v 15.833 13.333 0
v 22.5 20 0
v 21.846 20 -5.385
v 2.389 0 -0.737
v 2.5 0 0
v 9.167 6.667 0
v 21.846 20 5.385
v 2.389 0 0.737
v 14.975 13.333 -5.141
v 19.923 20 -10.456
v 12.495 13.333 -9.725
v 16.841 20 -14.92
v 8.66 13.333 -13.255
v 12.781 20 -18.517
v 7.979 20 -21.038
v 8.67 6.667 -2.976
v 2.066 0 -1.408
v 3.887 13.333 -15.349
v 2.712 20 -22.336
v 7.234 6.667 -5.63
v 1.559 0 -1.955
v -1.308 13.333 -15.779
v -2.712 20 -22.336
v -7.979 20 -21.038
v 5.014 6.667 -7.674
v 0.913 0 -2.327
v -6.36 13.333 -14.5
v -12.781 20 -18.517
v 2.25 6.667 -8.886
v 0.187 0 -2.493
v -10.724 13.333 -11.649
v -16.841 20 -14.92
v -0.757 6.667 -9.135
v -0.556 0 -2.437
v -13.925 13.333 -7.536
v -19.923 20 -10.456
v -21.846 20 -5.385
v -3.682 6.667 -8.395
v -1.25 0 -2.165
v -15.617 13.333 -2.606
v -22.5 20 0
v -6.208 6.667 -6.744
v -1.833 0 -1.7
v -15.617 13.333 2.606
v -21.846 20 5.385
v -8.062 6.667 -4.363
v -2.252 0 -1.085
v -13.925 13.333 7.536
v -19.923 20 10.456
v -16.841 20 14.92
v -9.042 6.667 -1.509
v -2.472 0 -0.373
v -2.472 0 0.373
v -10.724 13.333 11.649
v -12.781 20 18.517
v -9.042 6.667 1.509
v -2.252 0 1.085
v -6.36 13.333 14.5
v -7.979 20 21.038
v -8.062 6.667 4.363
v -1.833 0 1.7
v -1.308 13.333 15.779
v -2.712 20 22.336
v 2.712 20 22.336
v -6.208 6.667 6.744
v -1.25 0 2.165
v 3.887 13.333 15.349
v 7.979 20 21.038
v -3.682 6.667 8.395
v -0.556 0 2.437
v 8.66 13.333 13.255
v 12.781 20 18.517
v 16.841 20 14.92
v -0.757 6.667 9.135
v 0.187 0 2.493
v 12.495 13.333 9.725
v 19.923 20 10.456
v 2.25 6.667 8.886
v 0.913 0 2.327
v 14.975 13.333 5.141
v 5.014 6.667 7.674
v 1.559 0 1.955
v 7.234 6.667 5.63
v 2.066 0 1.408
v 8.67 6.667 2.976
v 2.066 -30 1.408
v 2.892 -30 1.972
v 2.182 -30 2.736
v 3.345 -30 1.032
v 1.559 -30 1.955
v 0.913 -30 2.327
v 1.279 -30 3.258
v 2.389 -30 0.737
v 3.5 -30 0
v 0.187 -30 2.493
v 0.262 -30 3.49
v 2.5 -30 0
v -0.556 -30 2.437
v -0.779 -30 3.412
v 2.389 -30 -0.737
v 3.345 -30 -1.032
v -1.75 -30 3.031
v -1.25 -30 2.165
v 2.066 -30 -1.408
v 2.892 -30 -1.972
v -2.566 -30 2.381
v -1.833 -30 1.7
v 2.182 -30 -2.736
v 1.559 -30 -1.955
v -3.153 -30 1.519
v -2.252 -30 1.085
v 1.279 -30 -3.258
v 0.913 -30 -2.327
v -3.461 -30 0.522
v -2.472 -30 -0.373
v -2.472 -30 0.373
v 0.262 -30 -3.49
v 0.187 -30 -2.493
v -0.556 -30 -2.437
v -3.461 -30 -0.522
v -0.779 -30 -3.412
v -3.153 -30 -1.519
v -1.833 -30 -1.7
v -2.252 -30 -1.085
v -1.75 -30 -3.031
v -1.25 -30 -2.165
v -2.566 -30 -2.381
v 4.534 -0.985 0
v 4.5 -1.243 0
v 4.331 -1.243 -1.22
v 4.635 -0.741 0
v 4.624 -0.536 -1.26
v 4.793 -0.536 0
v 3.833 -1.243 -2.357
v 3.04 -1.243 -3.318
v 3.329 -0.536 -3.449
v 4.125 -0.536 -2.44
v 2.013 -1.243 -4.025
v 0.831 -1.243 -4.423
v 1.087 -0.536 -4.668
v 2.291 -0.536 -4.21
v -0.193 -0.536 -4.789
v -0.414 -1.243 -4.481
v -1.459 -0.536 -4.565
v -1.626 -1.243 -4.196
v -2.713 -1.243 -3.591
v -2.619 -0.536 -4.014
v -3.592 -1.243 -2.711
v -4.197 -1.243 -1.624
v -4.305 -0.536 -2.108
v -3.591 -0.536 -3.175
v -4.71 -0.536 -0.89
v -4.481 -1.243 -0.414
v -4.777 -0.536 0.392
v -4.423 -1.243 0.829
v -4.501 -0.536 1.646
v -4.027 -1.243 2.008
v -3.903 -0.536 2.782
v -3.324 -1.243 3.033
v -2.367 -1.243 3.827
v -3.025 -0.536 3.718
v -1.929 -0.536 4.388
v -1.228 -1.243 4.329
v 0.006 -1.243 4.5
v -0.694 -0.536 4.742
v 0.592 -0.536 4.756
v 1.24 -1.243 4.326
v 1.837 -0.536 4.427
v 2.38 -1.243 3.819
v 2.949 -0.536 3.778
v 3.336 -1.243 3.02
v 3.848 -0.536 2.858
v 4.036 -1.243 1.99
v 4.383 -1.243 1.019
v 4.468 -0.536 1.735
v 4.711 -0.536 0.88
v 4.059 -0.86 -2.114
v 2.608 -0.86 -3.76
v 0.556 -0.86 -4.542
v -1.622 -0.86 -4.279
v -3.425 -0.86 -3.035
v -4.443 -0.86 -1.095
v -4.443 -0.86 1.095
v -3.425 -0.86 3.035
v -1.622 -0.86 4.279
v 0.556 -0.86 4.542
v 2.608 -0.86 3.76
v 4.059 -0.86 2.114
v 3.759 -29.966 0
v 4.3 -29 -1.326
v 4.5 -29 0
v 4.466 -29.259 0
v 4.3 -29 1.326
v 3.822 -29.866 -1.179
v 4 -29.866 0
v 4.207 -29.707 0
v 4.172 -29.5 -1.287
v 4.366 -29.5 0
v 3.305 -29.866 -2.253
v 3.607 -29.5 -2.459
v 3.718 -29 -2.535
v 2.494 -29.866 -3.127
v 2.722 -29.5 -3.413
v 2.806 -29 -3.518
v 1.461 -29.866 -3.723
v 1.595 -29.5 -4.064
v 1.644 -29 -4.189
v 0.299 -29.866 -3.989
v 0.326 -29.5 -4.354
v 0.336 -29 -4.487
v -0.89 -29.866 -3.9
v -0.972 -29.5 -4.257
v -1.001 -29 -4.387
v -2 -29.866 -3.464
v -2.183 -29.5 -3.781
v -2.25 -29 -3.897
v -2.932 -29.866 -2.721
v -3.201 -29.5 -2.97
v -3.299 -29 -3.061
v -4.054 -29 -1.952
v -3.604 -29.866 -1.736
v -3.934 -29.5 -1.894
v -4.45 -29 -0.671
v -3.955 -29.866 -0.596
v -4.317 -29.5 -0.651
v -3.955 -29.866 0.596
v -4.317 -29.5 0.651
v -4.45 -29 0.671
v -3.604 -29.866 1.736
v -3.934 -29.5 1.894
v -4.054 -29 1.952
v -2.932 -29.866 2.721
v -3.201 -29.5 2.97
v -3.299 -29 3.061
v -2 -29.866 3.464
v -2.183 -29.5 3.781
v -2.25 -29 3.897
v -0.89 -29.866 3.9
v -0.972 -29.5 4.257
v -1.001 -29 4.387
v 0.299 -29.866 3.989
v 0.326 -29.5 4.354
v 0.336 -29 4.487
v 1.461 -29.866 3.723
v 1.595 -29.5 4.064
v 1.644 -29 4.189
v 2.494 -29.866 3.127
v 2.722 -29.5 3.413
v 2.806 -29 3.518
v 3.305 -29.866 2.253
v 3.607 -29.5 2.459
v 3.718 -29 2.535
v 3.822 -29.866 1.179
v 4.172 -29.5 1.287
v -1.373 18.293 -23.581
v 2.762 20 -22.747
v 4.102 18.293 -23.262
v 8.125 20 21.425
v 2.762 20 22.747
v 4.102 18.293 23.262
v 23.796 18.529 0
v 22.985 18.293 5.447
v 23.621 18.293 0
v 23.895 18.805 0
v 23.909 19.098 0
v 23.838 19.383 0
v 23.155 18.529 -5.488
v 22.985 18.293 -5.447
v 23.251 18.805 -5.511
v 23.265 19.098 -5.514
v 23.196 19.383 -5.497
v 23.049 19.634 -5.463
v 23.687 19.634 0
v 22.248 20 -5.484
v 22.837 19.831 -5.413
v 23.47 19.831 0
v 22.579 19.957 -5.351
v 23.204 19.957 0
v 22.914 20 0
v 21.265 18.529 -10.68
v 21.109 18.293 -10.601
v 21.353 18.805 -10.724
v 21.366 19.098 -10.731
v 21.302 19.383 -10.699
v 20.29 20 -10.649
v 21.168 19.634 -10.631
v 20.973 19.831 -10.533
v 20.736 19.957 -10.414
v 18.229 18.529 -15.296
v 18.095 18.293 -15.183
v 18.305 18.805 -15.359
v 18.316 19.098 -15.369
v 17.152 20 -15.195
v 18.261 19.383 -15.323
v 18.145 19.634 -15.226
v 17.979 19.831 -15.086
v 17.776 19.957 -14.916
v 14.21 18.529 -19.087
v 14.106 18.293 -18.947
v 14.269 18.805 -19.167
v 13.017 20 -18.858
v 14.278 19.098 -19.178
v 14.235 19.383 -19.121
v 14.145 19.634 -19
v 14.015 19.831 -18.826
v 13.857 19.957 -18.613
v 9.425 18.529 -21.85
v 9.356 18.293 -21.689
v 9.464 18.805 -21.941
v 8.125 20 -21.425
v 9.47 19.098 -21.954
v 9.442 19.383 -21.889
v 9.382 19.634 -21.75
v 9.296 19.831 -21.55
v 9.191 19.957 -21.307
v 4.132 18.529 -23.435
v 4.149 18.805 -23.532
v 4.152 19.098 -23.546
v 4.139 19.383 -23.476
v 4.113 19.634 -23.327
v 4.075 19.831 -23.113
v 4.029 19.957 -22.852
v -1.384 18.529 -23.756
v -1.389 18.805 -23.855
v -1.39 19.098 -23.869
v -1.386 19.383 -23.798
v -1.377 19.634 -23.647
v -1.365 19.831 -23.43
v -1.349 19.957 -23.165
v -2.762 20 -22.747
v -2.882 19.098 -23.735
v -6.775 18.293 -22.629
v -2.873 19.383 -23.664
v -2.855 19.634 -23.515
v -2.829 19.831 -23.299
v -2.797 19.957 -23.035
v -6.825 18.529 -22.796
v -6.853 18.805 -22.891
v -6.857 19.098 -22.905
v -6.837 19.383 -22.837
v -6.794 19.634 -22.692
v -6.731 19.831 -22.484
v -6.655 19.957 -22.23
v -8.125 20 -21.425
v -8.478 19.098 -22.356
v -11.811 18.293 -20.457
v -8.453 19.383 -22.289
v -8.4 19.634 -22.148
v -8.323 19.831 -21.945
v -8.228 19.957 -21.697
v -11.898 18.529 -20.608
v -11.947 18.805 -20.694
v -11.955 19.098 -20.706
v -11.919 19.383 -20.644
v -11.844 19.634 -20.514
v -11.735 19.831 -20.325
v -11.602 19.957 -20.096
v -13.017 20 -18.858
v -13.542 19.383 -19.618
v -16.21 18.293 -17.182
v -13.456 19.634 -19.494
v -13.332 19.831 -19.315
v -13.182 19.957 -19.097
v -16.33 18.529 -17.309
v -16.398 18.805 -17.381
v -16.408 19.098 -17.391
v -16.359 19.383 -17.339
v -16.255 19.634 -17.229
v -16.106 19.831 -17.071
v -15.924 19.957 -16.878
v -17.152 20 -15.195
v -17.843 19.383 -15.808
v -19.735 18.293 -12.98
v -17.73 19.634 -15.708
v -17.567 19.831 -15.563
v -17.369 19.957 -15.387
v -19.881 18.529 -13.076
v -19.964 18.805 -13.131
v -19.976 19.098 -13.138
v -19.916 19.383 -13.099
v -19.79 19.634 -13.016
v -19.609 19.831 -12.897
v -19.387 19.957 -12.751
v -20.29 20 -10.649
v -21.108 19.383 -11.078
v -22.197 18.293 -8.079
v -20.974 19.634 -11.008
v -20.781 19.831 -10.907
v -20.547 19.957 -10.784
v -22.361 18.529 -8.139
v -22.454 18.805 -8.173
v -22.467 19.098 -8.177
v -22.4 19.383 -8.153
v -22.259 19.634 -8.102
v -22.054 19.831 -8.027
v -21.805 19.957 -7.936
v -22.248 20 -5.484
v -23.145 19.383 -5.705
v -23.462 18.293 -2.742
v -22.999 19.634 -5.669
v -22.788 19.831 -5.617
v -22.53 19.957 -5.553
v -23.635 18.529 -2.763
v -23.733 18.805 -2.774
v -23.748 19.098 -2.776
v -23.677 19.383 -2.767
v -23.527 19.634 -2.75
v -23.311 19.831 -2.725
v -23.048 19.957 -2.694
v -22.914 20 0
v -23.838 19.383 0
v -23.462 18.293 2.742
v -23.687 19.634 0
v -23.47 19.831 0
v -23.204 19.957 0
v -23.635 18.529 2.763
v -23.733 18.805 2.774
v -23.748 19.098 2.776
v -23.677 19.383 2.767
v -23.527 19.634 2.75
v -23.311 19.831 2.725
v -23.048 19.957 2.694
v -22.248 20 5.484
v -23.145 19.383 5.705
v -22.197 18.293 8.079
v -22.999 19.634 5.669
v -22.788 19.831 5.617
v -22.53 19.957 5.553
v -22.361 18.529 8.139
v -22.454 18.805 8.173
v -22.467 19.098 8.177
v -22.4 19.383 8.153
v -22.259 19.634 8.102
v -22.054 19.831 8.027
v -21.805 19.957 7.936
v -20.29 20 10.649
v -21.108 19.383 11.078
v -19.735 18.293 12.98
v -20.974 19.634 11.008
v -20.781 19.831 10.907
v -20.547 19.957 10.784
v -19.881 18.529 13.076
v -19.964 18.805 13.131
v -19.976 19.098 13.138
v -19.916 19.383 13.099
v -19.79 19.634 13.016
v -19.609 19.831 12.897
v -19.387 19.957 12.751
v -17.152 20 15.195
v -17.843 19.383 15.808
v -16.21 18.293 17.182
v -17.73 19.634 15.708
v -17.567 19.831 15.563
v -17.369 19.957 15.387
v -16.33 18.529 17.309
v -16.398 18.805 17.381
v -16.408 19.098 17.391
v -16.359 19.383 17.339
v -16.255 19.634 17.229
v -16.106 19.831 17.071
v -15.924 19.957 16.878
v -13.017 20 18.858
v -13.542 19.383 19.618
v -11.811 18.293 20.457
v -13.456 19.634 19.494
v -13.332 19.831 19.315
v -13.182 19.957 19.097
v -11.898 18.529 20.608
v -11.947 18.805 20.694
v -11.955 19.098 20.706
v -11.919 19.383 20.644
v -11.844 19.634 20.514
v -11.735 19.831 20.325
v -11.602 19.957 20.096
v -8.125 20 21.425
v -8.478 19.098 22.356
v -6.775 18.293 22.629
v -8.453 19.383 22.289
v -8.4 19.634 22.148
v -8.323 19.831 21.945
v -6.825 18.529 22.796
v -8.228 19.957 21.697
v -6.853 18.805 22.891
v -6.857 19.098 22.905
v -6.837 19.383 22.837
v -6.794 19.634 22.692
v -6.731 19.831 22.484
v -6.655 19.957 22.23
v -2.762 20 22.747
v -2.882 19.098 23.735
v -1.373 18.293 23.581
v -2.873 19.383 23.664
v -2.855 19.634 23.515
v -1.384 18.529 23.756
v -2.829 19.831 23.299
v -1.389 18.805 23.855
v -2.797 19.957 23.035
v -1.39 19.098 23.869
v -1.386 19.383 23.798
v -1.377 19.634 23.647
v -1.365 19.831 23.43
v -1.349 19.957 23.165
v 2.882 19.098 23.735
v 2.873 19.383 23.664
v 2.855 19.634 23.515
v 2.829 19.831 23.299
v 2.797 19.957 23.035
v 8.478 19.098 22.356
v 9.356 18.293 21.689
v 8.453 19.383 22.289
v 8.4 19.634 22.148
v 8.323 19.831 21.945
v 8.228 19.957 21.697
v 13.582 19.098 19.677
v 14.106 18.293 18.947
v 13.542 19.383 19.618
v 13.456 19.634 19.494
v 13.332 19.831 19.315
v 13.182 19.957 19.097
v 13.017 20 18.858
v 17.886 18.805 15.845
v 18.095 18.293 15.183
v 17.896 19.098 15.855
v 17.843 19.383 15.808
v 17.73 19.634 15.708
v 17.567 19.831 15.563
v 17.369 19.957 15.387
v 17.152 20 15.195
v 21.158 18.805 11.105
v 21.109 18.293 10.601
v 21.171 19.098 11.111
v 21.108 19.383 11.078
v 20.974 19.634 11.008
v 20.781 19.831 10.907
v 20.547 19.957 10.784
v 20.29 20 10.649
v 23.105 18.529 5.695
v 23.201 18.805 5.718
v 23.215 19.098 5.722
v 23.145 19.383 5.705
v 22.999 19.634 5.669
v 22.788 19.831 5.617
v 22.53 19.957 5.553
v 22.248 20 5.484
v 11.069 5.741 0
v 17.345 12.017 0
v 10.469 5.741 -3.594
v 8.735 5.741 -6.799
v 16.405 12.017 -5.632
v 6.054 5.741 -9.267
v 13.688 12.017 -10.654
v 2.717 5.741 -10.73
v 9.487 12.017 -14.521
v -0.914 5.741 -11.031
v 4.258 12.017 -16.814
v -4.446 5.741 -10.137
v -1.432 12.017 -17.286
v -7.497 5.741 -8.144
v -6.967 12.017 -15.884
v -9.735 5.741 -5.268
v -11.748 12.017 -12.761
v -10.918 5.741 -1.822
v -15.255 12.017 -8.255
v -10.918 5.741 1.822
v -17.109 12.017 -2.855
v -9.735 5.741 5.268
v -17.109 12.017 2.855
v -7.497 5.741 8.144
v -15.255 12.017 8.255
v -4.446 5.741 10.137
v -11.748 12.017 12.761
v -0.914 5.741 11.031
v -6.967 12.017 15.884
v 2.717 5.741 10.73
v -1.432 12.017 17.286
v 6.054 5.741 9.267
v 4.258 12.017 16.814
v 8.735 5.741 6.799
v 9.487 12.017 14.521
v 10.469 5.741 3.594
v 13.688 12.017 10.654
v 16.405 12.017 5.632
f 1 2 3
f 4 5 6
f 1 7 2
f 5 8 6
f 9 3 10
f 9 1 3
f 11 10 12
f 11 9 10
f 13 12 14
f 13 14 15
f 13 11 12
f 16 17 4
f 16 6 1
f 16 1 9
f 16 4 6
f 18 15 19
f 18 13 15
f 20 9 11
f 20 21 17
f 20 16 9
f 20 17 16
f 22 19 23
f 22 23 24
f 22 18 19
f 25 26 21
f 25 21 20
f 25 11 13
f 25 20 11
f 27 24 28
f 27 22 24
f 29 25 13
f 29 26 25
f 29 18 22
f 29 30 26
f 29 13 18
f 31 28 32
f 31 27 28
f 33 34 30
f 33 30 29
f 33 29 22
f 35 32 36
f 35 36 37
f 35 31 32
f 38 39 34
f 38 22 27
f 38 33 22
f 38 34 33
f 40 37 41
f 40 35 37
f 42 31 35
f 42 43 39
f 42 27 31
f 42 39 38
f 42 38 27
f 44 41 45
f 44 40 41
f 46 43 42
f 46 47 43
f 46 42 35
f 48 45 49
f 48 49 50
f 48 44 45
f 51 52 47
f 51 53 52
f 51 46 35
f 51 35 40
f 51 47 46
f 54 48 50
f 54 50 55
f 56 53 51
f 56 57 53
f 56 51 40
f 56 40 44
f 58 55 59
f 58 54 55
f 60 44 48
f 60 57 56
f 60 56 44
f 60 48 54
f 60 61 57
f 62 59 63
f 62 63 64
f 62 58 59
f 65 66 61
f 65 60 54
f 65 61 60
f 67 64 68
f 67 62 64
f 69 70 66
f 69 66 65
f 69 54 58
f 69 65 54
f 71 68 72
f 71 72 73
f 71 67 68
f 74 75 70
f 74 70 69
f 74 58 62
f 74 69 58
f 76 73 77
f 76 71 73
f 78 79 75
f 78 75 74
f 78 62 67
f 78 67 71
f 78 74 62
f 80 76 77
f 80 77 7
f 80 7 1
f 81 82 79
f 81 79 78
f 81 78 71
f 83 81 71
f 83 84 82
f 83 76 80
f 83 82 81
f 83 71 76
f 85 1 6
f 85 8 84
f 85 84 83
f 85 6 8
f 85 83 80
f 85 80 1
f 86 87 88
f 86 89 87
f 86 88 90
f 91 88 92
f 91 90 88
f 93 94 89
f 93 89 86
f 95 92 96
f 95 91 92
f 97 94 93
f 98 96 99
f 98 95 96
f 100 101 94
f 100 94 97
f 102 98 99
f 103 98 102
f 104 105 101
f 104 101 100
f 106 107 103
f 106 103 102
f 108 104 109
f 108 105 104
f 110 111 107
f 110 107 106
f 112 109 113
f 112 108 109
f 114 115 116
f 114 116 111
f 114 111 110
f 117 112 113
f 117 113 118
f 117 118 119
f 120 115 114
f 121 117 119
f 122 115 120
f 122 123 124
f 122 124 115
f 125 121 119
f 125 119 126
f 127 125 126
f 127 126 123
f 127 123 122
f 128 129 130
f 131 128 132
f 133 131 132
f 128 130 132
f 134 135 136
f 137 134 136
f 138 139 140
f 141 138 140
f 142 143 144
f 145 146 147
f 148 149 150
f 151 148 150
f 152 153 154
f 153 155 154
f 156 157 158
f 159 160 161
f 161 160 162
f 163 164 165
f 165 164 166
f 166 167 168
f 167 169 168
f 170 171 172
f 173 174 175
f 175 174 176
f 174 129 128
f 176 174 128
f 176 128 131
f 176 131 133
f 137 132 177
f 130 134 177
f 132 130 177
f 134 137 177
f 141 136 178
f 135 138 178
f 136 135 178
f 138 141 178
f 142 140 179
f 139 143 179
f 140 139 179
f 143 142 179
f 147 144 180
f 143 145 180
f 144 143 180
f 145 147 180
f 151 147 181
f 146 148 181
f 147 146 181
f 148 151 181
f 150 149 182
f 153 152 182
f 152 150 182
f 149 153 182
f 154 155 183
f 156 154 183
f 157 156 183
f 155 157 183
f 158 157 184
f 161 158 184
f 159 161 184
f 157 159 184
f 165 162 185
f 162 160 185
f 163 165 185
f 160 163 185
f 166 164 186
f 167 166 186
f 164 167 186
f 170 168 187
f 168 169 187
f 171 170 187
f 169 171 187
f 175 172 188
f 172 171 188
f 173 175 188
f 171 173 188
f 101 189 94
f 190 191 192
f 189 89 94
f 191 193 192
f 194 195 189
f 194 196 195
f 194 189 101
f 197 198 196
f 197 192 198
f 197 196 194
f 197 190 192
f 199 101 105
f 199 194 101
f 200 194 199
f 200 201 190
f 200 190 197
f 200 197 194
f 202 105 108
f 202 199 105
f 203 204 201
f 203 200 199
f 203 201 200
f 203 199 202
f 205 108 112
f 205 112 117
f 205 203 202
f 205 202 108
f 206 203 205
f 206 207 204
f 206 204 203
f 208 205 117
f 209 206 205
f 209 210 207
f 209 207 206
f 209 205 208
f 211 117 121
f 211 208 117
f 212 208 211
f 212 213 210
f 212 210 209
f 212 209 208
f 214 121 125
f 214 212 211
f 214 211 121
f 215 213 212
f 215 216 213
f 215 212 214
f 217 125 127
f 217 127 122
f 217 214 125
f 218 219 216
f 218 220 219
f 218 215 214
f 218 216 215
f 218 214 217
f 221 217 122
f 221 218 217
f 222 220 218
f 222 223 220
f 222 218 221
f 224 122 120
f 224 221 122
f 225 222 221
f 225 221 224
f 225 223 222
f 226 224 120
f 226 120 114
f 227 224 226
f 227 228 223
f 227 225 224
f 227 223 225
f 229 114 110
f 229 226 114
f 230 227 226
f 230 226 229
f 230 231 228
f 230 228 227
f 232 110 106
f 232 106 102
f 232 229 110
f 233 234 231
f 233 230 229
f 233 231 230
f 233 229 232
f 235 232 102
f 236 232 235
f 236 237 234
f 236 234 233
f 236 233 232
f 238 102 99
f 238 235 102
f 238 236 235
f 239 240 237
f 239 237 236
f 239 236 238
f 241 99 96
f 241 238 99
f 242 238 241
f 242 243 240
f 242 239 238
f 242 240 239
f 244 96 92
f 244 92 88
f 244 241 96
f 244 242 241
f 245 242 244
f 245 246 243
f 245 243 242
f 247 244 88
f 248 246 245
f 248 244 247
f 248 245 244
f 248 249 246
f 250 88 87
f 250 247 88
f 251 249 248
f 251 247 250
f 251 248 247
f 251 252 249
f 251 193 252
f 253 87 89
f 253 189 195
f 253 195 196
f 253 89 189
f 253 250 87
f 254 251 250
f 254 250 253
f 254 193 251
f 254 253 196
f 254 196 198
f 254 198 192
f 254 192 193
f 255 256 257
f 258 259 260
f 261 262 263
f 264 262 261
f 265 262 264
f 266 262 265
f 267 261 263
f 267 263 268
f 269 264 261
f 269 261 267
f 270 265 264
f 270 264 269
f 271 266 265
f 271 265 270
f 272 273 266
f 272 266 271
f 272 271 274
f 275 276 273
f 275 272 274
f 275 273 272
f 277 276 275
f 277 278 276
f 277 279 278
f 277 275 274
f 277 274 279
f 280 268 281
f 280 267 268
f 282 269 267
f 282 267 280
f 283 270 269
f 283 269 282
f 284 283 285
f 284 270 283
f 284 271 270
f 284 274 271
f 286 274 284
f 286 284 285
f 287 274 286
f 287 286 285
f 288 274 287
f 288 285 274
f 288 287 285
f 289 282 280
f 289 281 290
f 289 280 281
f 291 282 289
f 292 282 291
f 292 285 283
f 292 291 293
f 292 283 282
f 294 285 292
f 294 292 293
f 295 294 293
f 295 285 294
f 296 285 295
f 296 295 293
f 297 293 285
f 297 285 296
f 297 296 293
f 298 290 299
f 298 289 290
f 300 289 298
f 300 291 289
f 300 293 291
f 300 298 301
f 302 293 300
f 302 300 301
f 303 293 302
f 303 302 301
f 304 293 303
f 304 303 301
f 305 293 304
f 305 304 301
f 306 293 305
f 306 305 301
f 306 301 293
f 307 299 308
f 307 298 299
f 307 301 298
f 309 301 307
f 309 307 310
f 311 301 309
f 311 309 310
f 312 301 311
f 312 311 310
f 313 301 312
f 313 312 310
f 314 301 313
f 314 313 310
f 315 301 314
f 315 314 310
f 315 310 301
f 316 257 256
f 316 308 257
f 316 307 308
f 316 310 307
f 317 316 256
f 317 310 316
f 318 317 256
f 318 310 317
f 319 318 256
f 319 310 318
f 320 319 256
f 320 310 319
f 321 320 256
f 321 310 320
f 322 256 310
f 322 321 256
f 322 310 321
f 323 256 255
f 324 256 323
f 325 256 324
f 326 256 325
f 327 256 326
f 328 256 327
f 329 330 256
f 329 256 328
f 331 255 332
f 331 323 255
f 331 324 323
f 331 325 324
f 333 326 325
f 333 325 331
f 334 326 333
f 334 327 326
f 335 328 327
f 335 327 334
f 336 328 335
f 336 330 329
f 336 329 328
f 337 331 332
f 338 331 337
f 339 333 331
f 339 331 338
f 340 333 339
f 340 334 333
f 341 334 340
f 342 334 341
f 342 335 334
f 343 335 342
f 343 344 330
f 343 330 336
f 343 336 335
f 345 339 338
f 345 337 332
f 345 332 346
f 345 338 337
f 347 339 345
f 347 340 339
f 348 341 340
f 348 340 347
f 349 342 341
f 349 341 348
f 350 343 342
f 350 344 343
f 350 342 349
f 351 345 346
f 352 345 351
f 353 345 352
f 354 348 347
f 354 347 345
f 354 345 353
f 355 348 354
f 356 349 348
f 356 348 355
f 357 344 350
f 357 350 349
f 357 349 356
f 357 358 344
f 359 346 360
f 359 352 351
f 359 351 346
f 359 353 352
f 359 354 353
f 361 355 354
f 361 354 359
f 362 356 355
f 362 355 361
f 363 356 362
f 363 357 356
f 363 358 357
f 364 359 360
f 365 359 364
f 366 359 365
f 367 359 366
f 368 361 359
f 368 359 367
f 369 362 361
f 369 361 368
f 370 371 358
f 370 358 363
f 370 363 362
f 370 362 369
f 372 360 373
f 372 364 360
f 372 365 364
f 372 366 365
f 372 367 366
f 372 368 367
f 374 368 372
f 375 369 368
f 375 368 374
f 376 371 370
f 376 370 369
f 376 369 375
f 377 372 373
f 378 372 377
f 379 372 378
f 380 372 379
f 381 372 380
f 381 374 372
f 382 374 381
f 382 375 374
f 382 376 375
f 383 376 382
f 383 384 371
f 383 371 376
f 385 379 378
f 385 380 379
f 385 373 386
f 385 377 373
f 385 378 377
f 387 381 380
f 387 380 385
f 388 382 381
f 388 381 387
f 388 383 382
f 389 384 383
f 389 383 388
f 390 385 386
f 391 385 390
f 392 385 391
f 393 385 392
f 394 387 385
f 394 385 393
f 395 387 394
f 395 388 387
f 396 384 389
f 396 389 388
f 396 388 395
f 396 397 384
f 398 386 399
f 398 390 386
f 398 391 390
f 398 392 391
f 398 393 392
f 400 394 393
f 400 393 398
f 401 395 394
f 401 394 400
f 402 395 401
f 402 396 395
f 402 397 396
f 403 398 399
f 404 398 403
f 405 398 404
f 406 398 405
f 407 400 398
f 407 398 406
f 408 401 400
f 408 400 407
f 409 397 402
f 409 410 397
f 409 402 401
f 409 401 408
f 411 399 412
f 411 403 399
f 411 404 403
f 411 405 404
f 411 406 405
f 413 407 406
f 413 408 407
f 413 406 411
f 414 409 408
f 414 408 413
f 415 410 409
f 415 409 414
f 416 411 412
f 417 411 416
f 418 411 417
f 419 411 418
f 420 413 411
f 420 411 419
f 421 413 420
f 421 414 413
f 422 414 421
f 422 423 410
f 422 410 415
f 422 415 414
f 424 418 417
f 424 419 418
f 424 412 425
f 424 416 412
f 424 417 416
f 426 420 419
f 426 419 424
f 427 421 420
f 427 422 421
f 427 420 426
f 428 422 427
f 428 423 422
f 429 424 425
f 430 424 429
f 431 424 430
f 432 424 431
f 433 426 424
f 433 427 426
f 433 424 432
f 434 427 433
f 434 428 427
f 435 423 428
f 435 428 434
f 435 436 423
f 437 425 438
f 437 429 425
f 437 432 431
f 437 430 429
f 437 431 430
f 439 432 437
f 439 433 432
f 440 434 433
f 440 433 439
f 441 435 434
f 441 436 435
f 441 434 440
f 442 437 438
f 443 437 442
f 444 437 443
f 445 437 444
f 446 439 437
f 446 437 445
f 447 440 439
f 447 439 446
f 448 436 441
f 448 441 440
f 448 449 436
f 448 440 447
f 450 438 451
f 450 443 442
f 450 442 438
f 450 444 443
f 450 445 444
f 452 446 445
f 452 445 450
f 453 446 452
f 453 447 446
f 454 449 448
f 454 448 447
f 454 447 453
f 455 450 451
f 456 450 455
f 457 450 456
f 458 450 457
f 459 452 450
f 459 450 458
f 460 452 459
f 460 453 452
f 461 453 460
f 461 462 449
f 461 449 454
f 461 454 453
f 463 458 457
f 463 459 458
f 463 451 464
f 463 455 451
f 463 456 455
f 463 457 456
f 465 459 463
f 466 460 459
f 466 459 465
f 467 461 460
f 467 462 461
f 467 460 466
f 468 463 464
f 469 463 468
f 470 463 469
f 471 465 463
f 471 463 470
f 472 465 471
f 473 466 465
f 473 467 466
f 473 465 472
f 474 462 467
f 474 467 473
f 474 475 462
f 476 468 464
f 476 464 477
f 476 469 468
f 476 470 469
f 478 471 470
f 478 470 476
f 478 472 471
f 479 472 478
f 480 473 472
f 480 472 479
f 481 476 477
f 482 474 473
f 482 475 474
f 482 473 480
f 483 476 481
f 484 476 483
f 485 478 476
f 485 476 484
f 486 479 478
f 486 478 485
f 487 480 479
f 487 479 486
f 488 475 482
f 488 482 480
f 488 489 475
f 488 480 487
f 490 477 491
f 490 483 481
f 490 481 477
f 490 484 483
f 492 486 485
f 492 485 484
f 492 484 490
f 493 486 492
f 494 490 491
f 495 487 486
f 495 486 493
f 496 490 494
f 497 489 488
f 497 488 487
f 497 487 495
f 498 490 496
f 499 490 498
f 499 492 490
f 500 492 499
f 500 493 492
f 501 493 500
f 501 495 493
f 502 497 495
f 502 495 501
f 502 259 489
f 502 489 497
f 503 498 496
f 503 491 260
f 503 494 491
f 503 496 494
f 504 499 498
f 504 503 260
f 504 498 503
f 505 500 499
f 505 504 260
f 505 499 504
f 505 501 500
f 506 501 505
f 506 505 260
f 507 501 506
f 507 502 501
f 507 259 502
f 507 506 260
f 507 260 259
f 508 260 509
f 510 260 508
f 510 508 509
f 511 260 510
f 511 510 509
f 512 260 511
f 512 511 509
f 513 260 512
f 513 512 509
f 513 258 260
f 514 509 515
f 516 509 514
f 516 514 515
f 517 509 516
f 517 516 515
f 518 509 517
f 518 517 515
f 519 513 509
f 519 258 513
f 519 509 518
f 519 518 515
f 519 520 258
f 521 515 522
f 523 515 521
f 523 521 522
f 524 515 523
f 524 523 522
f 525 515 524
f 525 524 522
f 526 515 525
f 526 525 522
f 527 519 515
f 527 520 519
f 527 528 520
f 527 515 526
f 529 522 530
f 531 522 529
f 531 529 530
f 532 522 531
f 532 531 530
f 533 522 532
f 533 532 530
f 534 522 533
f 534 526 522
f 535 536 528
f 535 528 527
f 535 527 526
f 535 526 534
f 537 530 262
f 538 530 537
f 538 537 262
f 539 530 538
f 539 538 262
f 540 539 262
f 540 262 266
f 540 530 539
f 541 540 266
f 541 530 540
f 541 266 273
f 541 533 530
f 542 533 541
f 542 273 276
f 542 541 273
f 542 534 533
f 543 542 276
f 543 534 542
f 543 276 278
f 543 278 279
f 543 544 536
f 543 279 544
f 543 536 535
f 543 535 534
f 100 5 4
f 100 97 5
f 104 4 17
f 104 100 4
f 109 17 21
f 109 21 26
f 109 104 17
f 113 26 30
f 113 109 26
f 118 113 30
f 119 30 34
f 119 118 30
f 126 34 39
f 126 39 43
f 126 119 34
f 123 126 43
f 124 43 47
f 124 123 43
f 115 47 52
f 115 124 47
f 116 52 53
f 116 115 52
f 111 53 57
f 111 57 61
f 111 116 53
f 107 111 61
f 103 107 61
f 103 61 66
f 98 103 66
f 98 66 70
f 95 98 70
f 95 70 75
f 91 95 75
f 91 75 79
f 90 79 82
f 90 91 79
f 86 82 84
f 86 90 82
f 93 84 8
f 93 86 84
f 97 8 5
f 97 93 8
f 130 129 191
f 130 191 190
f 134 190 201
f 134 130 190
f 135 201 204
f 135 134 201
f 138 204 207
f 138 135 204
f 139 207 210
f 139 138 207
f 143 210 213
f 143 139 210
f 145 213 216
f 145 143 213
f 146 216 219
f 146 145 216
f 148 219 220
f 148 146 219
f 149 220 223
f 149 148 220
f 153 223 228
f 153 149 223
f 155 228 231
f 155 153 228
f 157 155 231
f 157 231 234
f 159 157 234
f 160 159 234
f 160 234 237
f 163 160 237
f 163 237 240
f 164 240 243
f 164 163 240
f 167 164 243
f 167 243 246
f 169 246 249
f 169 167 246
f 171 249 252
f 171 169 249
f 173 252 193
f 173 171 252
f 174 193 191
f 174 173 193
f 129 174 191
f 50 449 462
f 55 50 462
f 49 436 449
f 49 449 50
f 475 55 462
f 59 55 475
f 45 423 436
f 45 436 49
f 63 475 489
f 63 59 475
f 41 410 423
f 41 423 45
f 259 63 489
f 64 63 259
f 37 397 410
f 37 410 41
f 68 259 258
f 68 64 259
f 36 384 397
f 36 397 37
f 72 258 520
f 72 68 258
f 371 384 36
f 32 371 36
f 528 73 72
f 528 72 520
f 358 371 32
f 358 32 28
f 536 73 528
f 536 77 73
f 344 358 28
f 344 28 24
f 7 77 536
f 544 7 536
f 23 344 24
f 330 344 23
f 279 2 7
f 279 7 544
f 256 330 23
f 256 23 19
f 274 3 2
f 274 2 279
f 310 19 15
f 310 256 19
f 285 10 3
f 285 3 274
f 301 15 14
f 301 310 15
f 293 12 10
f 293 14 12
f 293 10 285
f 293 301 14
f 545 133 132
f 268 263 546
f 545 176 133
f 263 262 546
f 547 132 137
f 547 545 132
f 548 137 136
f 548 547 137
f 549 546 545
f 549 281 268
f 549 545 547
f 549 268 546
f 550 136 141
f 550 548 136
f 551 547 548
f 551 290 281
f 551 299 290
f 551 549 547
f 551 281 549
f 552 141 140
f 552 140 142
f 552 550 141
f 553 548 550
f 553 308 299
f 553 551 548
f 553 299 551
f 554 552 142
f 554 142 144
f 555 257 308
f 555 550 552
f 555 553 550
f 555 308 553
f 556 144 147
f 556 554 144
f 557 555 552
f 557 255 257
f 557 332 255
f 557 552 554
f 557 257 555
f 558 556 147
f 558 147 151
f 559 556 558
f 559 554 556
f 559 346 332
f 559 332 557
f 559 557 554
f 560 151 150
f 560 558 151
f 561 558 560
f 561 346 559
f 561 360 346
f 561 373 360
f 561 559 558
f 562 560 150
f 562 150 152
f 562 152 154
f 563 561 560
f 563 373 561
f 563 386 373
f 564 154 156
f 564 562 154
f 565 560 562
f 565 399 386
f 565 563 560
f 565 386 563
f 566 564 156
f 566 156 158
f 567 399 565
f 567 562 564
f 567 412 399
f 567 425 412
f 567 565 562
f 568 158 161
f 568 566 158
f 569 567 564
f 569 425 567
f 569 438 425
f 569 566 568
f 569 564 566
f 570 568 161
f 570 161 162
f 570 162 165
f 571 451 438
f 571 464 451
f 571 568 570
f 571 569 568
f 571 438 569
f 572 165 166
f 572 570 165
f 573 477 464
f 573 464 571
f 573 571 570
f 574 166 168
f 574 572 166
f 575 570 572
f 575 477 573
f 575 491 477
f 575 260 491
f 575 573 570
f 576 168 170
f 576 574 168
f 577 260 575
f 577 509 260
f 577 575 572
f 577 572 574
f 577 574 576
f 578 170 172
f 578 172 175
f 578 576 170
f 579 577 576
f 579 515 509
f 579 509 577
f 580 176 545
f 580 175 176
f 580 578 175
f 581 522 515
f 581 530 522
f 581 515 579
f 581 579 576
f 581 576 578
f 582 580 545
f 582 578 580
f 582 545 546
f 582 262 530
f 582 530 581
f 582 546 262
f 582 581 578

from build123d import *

# Parameters (mm, degrees)
FILLET_1_R = 1


with BuildPart() as part:
    # Эскиз1 → Повернуть1 (revolve)
    with BuildSketch(Plane.XY):
        Polygon((2.5, 0), (2.5, -30), (4.5, -30), (4.5, -0.828427125), (25.328427125, 20), (22.5, 20), align=None)
    revolve(axis=Axis((0, 0, 0), (0, 1, 0)))

    # Скругление1
    fillet_1_edges = [part.edges().sort_by_distance(p)[0] for p in [
        (-4.5, -30, 0),
        (-4.5, -0.828427125, 0),
        (-25.328427125, 20, 0),
    ]]
    fillet(fillet_1_edges, radius=FILLET_1_R)


solid = part.part
